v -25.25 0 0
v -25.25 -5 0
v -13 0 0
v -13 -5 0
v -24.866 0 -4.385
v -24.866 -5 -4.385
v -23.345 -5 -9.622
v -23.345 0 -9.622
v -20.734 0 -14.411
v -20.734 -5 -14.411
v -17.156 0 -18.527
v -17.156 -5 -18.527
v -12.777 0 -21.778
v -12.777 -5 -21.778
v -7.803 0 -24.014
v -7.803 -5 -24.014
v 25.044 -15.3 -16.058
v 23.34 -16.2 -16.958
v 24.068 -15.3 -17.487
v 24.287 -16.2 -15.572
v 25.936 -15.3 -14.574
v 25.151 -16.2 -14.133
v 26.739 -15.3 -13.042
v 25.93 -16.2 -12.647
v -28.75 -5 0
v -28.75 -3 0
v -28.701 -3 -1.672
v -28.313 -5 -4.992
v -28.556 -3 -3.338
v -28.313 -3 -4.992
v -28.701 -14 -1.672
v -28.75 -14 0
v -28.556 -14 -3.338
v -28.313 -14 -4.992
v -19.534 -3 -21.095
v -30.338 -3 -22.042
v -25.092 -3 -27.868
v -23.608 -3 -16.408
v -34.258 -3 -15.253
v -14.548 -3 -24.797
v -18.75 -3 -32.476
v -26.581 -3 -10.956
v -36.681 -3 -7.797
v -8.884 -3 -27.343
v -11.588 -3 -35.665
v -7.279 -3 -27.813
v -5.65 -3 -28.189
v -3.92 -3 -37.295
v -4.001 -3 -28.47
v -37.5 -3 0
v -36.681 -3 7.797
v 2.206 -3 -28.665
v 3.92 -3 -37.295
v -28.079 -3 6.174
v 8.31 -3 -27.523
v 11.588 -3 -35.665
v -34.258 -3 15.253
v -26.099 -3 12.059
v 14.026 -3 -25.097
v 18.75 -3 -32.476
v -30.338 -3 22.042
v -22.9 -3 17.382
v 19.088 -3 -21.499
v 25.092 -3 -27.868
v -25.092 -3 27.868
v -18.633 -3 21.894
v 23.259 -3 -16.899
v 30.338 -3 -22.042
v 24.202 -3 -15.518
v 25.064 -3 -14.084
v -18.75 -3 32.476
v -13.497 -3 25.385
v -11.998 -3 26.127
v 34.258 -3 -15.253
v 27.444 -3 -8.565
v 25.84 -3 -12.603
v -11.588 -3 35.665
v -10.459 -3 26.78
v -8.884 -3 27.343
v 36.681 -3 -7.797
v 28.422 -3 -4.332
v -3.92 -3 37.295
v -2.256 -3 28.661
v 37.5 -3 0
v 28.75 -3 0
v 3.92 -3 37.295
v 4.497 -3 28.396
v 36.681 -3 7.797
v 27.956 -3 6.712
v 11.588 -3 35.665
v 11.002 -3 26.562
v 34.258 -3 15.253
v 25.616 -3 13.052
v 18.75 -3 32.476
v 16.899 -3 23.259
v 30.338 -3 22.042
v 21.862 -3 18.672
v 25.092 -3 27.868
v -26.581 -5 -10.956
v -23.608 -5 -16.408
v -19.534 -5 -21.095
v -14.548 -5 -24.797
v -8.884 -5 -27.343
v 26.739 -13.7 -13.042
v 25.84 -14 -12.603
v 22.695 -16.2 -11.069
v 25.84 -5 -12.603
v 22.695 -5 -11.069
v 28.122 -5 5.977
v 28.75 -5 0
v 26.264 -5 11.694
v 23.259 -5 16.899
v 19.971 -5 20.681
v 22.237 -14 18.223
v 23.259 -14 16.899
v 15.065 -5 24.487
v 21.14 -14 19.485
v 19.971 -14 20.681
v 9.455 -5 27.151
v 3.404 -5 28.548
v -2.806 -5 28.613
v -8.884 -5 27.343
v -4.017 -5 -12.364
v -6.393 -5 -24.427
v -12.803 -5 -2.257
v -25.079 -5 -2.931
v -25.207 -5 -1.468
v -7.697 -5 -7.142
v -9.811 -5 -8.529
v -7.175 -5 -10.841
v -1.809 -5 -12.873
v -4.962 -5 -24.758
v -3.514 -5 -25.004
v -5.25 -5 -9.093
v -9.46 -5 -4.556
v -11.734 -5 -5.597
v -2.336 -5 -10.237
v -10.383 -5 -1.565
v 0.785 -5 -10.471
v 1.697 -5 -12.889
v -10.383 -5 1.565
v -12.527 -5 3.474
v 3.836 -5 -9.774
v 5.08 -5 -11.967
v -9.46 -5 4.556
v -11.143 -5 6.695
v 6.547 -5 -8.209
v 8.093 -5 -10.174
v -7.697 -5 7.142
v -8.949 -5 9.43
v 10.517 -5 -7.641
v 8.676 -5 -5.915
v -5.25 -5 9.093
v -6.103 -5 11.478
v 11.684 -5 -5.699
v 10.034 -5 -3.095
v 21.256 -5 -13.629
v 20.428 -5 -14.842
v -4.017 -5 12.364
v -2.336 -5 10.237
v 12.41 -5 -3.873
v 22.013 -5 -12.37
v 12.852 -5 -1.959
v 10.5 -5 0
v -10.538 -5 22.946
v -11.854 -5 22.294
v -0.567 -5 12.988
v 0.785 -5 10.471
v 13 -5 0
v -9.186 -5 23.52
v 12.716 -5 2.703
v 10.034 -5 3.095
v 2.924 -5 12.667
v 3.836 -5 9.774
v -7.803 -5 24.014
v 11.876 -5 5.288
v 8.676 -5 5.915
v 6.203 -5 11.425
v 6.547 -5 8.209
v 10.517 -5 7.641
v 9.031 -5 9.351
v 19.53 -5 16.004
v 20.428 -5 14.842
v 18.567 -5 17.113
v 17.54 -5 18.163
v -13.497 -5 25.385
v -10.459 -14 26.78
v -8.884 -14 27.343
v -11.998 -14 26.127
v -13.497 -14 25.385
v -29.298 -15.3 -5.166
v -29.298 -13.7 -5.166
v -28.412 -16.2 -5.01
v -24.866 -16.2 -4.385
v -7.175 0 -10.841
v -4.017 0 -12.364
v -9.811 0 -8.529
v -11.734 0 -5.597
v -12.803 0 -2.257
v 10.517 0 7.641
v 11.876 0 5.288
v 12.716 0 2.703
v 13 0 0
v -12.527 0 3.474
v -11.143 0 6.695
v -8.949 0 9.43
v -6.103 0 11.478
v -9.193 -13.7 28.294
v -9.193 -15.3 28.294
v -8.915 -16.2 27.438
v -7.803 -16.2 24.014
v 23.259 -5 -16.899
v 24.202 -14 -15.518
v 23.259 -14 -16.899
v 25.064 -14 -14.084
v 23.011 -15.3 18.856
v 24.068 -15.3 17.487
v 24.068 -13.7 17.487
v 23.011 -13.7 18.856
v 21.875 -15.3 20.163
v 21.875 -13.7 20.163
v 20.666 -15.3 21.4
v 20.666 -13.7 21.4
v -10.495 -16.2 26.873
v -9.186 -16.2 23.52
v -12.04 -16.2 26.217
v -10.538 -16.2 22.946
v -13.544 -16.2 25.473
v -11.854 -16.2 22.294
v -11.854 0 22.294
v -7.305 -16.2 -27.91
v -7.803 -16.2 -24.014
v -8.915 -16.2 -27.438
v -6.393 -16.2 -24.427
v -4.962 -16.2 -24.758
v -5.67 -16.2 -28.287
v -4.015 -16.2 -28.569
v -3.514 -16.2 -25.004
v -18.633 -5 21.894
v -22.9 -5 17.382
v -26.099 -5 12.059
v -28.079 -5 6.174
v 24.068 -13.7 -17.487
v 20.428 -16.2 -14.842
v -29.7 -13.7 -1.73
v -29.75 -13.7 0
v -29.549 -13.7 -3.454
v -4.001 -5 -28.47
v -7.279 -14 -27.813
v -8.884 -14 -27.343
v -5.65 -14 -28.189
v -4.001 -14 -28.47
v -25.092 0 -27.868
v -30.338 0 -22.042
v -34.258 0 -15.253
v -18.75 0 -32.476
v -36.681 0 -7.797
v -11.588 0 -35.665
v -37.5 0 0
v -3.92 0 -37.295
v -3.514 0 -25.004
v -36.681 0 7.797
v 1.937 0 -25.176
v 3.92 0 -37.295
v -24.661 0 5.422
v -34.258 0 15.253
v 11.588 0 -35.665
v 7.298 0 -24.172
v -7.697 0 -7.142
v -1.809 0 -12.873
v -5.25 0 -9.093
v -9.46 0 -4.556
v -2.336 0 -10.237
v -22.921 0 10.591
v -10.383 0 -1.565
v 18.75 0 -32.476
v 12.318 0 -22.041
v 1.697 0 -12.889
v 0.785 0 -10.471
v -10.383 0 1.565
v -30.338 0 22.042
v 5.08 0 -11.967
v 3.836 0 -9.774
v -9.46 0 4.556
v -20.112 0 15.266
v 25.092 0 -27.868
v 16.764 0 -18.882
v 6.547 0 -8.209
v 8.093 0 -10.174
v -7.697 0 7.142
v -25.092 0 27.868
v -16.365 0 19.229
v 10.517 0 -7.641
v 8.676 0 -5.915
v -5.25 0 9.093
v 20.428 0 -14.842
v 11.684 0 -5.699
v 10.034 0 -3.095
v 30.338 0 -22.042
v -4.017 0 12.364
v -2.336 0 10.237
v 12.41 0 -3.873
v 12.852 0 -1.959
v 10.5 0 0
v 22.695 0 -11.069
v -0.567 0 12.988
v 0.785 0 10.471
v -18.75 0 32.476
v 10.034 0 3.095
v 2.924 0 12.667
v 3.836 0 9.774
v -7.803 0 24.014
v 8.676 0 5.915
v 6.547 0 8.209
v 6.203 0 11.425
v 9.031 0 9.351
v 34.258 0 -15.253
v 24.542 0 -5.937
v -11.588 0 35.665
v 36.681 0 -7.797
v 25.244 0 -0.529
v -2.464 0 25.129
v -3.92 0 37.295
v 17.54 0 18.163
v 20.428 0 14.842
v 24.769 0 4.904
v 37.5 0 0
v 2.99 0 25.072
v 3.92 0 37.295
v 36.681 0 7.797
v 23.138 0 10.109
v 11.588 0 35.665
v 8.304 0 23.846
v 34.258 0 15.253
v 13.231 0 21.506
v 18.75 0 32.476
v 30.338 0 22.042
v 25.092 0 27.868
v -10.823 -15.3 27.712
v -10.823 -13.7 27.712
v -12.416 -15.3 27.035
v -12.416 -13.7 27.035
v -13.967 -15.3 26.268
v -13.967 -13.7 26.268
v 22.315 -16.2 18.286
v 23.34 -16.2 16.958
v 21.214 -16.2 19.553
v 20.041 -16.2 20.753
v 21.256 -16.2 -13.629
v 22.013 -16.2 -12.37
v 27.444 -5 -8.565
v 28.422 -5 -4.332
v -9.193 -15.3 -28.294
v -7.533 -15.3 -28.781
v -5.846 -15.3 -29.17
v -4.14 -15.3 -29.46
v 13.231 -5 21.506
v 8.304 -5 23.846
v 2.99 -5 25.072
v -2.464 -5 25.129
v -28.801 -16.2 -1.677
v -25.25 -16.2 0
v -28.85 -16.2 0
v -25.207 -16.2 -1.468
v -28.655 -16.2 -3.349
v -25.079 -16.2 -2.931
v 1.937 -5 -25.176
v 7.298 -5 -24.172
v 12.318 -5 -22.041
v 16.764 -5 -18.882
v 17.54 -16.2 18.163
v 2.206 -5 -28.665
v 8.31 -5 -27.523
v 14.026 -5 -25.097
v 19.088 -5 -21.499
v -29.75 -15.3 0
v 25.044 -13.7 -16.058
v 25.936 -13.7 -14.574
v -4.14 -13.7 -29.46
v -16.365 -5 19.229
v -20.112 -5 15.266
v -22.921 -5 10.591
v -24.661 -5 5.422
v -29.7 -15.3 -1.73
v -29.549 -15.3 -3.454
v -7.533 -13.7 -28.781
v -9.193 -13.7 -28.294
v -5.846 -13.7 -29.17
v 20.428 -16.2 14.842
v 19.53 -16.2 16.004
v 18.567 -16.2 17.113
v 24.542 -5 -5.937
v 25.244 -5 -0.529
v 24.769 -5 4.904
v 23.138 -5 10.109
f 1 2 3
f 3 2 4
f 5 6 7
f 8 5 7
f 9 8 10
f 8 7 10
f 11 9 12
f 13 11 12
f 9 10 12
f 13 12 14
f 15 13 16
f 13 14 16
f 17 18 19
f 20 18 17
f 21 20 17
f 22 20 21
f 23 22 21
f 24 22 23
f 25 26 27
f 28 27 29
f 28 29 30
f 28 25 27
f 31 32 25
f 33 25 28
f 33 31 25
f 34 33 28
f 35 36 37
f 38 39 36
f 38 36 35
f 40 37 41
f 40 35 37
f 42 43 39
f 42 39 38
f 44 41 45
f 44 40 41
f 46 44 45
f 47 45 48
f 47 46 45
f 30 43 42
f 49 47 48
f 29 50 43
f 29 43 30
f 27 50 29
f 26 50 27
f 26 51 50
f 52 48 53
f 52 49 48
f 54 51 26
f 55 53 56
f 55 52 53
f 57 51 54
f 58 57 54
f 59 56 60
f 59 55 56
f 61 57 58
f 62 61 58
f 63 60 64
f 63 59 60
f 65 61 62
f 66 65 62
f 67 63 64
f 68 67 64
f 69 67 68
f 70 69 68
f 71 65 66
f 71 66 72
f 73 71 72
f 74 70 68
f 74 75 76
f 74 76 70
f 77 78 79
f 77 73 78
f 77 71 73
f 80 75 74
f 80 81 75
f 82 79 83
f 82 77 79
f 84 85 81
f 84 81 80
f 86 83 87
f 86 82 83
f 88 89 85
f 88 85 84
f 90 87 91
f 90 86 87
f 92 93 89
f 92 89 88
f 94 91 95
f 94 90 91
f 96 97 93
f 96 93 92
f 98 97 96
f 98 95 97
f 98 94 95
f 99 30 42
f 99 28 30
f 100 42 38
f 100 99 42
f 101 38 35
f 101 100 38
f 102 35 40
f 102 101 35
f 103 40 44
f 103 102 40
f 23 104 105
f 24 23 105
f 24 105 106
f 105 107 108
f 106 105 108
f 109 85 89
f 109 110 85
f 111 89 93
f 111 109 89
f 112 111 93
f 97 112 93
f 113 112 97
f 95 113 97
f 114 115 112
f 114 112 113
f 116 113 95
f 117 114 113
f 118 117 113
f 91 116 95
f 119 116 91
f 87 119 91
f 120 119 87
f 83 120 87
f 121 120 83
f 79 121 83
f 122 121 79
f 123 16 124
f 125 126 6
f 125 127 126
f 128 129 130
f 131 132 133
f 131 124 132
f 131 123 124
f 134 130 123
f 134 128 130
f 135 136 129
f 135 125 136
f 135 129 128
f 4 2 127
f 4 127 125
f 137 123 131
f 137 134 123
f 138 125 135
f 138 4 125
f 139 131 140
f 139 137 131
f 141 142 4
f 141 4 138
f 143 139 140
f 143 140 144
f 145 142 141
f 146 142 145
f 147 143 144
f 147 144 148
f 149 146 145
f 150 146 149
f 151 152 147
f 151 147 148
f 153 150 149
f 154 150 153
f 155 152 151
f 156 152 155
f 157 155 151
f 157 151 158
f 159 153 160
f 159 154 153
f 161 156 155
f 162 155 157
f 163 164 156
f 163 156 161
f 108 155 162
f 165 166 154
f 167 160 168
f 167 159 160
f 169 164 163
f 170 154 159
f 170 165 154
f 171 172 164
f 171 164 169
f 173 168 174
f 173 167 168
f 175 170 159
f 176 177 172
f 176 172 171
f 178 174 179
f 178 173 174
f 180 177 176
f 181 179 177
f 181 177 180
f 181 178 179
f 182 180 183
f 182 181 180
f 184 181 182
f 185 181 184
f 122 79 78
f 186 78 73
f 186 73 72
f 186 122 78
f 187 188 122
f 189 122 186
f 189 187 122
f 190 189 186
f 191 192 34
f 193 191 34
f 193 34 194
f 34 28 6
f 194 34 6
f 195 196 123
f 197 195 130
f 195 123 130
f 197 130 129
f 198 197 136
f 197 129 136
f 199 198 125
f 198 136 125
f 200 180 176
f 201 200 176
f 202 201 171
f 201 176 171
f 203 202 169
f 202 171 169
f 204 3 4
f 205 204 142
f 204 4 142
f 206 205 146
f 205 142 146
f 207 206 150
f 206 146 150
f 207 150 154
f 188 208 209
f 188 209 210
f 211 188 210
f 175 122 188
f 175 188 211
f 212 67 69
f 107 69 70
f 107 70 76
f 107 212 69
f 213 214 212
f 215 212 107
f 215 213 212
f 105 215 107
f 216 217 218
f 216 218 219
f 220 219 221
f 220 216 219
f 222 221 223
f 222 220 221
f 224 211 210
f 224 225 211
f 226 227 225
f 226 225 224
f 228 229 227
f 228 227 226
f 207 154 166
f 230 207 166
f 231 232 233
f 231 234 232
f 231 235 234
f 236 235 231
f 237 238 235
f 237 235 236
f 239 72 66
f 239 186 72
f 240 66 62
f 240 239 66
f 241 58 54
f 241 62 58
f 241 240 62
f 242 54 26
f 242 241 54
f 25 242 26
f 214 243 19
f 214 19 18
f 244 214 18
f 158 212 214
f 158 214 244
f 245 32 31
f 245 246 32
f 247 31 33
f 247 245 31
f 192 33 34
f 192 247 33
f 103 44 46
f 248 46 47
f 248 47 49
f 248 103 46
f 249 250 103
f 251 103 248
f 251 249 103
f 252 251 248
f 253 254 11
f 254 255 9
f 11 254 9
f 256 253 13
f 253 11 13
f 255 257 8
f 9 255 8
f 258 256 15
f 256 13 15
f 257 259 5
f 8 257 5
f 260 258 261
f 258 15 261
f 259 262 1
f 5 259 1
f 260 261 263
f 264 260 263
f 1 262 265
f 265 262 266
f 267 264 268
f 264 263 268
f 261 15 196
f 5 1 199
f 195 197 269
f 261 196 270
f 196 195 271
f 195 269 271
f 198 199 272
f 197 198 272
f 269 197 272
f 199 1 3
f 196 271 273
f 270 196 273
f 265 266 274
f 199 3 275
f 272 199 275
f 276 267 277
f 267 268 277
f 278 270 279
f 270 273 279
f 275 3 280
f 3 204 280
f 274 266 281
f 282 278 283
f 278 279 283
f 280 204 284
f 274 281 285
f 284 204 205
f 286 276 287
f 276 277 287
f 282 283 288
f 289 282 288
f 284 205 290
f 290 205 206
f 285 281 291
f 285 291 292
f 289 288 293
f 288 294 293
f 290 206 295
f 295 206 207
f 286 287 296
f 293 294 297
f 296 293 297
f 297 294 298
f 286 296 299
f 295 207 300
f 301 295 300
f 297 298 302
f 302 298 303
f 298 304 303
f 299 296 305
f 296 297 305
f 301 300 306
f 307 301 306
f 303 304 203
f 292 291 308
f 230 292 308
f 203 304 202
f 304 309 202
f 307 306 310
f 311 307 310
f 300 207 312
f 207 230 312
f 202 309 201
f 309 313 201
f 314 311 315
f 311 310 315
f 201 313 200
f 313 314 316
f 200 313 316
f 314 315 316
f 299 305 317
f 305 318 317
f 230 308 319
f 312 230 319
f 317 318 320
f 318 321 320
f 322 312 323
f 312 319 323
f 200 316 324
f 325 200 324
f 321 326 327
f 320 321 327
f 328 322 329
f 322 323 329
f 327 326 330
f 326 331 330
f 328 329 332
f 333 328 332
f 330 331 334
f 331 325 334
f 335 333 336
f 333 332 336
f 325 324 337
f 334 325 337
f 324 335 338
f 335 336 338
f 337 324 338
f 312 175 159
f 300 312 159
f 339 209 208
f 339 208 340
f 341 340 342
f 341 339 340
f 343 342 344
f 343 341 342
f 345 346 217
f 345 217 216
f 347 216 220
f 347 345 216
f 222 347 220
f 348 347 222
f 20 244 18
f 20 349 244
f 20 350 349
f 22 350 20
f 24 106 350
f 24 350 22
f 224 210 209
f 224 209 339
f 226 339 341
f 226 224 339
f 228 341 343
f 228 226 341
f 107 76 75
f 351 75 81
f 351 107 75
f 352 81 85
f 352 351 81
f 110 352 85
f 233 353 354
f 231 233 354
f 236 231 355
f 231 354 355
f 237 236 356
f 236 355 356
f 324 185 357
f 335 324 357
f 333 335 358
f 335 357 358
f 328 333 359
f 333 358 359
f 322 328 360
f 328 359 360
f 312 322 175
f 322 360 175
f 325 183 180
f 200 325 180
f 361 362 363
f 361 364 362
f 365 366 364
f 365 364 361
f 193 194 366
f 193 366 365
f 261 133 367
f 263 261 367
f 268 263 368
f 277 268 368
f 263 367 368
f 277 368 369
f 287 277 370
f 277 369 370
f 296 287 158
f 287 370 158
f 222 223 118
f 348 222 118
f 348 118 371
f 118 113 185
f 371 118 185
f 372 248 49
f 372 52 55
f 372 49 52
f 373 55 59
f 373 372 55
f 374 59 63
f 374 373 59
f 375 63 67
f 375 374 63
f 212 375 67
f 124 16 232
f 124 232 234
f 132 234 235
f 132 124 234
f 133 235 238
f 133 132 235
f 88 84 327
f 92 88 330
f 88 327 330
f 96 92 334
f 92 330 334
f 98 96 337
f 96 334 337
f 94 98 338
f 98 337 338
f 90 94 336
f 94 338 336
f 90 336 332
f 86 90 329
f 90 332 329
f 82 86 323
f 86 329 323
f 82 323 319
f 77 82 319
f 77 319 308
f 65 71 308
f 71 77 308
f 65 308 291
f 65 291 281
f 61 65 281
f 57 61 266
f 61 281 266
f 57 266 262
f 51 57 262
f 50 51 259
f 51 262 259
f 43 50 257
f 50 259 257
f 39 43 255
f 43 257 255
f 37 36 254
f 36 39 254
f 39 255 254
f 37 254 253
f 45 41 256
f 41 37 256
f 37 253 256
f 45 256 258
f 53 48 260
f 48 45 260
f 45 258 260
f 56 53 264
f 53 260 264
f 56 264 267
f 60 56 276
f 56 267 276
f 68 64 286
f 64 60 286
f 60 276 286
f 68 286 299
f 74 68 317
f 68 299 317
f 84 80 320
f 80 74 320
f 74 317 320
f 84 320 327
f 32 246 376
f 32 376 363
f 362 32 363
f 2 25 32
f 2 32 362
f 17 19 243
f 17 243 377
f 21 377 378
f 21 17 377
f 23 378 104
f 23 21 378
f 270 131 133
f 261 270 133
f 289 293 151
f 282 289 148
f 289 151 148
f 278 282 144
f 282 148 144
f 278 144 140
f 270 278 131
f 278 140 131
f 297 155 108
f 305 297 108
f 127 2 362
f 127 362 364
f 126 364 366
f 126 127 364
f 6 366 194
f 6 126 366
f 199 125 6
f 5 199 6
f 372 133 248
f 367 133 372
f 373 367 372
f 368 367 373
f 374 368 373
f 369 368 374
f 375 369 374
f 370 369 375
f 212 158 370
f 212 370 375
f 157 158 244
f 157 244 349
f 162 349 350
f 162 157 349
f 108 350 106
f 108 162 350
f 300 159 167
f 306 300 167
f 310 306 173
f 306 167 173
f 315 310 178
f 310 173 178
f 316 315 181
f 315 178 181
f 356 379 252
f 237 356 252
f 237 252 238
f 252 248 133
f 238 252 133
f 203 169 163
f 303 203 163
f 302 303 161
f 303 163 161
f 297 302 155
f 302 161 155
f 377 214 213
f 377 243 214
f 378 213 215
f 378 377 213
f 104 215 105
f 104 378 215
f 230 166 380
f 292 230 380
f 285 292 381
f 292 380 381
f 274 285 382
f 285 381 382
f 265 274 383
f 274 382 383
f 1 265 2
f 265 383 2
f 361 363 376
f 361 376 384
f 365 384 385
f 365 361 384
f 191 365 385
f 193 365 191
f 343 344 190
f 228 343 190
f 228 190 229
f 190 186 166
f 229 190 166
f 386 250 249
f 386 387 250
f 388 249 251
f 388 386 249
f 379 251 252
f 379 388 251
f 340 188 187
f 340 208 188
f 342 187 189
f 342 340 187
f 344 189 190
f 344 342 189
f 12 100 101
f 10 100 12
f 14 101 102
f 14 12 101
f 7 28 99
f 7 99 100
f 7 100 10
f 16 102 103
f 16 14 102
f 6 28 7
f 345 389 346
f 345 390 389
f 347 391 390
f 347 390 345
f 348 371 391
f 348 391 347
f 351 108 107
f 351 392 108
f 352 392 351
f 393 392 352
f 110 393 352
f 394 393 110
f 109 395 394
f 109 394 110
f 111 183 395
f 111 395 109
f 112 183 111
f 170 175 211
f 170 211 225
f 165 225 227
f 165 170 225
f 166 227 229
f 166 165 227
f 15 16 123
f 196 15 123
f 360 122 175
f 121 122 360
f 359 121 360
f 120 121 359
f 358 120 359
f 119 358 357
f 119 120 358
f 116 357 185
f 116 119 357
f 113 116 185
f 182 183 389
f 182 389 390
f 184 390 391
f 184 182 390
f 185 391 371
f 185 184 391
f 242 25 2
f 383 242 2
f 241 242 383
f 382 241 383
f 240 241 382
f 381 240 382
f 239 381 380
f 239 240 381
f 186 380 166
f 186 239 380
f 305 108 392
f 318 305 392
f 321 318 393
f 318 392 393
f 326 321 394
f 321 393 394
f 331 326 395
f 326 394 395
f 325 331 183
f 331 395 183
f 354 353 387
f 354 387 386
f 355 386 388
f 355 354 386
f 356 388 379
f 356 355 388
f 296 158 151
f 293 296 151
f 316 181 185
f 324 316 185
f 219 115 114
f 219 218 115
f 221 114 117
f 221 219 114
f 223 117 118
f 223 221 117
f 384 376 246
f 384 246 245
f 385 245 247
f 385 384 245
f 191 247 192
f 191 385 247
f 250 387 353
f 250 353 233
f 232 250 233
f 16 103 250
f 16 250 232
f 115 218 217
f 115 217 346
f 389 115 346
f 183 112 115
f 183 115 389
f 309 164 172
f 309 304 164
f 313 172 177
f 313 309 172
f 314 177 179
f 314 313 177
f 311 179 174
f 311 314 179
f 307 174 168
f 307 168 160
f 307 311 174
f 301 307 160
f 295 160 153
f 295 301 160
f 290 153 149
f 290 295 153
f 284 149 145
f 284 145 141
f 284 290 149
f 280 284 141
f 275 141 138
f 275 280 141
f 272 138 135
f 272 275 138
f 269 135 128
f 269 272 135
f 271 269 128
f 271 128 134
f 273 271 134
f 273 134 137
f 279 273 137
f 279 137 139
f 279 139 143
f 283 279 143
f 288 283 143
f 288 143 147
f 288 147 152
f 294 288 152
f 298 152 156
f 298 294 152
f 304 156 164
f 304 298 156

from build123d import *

# Parameters (mm, degrees)
F0_R     = 37.5
F0_R_2   = 28.75
F0_R_3   = 10.5
F1_DEPTH = 3
F3_ANGLE = 10
F4_COUNT = 5
F5_DEPTH = 5
F6_SIZE  = 0.9
F8_DEPTH = 25


with BuildPart() as f1:
    # F0 (on Front) → F1 (new body)
    with BuildSketch(Plane.XZ):
        Circle(F0_R)
        Circle(F0_R_2, mode=Mode.SUBTRACT)
        Circle(F0_R_2)
        Circle(F0_R_3, mode=Mode.SUBTRACT)
    extrude(amount=F1_DEPTH)

    # F2 (on Top) → F3 (revolve)
    with BuildSketch(Plane.XY):
        Polygon((-25.25, -16.2), (-25.25, -3), (-28.75, -3), (-28.75, -14), (-29.75, -13.7), (-29.75, -16.2), align=None)
    revolve(axis=Axis((0, 0, 0), (0, -1, 0)), revolution_arc=F3_ANGLE)

    # F4: F1 ×5 about axis
    f4_axis = Axis((0, 0, 0), (0, -1, 0))


with BuildPart() as f1_1:
    add(f1.part)
    for i in range(1, F4_COUNT):
        add(f1.part.rotate(f4_axis, i * 360 / F4_COUNT))

    # F0 (on Front) → F5 (join)
    with BuildSketch(Plane.XZ):
        Circle(F0_R_2)
        Circle(F0_R_3, mode=Mode.SUBTRACT)
    extrude(amount=F5_DEPTH)

    # F6
    f6_edges = [f1_1.edges().sort_by_distance(p)[0] for p in [
        (-29.636792, -16.2, -2.592883),
        (-6.692294, -16.2, -28.987509),
        (25.500727, -16.2, -15.322383),
        (22.45261, -16.2, 19.517756),
        (-11.624251, -16.2, 27.385019),
    ]]
    chamfer(f6_edges, length=F6_SIZE)

    # F7 (on face) → F8 (cut)
    with BuildSketch(Plane.XZ.offset(5)):
        with BuildLine():
            ThreePointArc((-13, 0), (-11.1431749091, 6.6954949738), (-6.1031303162, 11.4783187072))
            Line((-6.1031303162, 11.4783187072), (-11.8541569603, 22.2944267197))
            ThreePointArc((-11.8541569603, 22.2944267197), (-21.6434743427, 13.0047113915), (-25.25, 0))
            Line((-25.25, 0), (-13, 0))
        make_face()
        with BuildLine():
            Line((-7.802679108, -24.0141770365), (-4.0172209269, -12.3637347118))
            ThreePointArc((-4.0172209269, -12.3637347118), (-9.8112245429, -8.5287673769), (-12.8025007892, -2.2574263097))
            Line((-12.8025007892, -2.2574263097), (-24.8663957636, -4.3846164861))
            ThreePointArc((-24.8663957636, -4.3846164861), (-19.0564169006, -16.565490482), (-7.802679108, -24.0141770365))
        make_face()
        with BuildLine():
            Line((20.427679108, -14.8415776204), (10.5172209269, -7.6412082798))
            ThreePointArc((10.5172209269, -7.6412082798), (5.0795046704, -11.9665630949), (-1.8092503125, -12.8734848936))
            Line((-1.8092503125, -12.8734848936), (-3.5141207992, -25.0042687357))
            ThreePointArc((-3.5141207992, -25.0042687357), (9.8659609944, -23.2427475497), (20.427679108, -14.8415776204))
        make_face()
        with BuildLine():
            ThreePointArc((10.5172209269, 7.6412082798), (12.3637347118, 4.0172209269), (13, 0))
            ThreePointArc((13, 0), (12.6668108422, -2.9243637065), (11.6843226019, -5.6988249083))
            Line((11.6843226019, -5.6988249083), (22.6945496691, -11.0688714564))
            ThreePointArc((22.6945496691, -11.0688714564), (24.6028441358, -5.6800141222), (25.25, 0))
            ThreePointArc((25.25, 0), (24.0141770365, 7.802679108), (20.427679108, 14.8415776204))
            Line((20.427679108, 14.8415776204), (10.5172209269, 7.6412082798))
        make_face()
        with BuildLine():
            ThreePointArc((-4.0172209269, 12.3637347118), (2.9243637065, 12.6668108422), (9.030558816, 9.3514174044))
            Line((9.030558816, 9.3514174044), (17.5401238541, 18.1633299586))
            ThreePointArc((17.5401238541, 18.1633299586), (5.6800141222, 24.6028441358), (-7.802679108, 24.0141770365))
            Line((-7.802679108, 24.0141770365), (-4.0172209269, 12.3637347118))
        make_face()
    extrude(amount=-F8_DEPTH, mode=Mode.SUBTRACT)


solid = f1_1.part
